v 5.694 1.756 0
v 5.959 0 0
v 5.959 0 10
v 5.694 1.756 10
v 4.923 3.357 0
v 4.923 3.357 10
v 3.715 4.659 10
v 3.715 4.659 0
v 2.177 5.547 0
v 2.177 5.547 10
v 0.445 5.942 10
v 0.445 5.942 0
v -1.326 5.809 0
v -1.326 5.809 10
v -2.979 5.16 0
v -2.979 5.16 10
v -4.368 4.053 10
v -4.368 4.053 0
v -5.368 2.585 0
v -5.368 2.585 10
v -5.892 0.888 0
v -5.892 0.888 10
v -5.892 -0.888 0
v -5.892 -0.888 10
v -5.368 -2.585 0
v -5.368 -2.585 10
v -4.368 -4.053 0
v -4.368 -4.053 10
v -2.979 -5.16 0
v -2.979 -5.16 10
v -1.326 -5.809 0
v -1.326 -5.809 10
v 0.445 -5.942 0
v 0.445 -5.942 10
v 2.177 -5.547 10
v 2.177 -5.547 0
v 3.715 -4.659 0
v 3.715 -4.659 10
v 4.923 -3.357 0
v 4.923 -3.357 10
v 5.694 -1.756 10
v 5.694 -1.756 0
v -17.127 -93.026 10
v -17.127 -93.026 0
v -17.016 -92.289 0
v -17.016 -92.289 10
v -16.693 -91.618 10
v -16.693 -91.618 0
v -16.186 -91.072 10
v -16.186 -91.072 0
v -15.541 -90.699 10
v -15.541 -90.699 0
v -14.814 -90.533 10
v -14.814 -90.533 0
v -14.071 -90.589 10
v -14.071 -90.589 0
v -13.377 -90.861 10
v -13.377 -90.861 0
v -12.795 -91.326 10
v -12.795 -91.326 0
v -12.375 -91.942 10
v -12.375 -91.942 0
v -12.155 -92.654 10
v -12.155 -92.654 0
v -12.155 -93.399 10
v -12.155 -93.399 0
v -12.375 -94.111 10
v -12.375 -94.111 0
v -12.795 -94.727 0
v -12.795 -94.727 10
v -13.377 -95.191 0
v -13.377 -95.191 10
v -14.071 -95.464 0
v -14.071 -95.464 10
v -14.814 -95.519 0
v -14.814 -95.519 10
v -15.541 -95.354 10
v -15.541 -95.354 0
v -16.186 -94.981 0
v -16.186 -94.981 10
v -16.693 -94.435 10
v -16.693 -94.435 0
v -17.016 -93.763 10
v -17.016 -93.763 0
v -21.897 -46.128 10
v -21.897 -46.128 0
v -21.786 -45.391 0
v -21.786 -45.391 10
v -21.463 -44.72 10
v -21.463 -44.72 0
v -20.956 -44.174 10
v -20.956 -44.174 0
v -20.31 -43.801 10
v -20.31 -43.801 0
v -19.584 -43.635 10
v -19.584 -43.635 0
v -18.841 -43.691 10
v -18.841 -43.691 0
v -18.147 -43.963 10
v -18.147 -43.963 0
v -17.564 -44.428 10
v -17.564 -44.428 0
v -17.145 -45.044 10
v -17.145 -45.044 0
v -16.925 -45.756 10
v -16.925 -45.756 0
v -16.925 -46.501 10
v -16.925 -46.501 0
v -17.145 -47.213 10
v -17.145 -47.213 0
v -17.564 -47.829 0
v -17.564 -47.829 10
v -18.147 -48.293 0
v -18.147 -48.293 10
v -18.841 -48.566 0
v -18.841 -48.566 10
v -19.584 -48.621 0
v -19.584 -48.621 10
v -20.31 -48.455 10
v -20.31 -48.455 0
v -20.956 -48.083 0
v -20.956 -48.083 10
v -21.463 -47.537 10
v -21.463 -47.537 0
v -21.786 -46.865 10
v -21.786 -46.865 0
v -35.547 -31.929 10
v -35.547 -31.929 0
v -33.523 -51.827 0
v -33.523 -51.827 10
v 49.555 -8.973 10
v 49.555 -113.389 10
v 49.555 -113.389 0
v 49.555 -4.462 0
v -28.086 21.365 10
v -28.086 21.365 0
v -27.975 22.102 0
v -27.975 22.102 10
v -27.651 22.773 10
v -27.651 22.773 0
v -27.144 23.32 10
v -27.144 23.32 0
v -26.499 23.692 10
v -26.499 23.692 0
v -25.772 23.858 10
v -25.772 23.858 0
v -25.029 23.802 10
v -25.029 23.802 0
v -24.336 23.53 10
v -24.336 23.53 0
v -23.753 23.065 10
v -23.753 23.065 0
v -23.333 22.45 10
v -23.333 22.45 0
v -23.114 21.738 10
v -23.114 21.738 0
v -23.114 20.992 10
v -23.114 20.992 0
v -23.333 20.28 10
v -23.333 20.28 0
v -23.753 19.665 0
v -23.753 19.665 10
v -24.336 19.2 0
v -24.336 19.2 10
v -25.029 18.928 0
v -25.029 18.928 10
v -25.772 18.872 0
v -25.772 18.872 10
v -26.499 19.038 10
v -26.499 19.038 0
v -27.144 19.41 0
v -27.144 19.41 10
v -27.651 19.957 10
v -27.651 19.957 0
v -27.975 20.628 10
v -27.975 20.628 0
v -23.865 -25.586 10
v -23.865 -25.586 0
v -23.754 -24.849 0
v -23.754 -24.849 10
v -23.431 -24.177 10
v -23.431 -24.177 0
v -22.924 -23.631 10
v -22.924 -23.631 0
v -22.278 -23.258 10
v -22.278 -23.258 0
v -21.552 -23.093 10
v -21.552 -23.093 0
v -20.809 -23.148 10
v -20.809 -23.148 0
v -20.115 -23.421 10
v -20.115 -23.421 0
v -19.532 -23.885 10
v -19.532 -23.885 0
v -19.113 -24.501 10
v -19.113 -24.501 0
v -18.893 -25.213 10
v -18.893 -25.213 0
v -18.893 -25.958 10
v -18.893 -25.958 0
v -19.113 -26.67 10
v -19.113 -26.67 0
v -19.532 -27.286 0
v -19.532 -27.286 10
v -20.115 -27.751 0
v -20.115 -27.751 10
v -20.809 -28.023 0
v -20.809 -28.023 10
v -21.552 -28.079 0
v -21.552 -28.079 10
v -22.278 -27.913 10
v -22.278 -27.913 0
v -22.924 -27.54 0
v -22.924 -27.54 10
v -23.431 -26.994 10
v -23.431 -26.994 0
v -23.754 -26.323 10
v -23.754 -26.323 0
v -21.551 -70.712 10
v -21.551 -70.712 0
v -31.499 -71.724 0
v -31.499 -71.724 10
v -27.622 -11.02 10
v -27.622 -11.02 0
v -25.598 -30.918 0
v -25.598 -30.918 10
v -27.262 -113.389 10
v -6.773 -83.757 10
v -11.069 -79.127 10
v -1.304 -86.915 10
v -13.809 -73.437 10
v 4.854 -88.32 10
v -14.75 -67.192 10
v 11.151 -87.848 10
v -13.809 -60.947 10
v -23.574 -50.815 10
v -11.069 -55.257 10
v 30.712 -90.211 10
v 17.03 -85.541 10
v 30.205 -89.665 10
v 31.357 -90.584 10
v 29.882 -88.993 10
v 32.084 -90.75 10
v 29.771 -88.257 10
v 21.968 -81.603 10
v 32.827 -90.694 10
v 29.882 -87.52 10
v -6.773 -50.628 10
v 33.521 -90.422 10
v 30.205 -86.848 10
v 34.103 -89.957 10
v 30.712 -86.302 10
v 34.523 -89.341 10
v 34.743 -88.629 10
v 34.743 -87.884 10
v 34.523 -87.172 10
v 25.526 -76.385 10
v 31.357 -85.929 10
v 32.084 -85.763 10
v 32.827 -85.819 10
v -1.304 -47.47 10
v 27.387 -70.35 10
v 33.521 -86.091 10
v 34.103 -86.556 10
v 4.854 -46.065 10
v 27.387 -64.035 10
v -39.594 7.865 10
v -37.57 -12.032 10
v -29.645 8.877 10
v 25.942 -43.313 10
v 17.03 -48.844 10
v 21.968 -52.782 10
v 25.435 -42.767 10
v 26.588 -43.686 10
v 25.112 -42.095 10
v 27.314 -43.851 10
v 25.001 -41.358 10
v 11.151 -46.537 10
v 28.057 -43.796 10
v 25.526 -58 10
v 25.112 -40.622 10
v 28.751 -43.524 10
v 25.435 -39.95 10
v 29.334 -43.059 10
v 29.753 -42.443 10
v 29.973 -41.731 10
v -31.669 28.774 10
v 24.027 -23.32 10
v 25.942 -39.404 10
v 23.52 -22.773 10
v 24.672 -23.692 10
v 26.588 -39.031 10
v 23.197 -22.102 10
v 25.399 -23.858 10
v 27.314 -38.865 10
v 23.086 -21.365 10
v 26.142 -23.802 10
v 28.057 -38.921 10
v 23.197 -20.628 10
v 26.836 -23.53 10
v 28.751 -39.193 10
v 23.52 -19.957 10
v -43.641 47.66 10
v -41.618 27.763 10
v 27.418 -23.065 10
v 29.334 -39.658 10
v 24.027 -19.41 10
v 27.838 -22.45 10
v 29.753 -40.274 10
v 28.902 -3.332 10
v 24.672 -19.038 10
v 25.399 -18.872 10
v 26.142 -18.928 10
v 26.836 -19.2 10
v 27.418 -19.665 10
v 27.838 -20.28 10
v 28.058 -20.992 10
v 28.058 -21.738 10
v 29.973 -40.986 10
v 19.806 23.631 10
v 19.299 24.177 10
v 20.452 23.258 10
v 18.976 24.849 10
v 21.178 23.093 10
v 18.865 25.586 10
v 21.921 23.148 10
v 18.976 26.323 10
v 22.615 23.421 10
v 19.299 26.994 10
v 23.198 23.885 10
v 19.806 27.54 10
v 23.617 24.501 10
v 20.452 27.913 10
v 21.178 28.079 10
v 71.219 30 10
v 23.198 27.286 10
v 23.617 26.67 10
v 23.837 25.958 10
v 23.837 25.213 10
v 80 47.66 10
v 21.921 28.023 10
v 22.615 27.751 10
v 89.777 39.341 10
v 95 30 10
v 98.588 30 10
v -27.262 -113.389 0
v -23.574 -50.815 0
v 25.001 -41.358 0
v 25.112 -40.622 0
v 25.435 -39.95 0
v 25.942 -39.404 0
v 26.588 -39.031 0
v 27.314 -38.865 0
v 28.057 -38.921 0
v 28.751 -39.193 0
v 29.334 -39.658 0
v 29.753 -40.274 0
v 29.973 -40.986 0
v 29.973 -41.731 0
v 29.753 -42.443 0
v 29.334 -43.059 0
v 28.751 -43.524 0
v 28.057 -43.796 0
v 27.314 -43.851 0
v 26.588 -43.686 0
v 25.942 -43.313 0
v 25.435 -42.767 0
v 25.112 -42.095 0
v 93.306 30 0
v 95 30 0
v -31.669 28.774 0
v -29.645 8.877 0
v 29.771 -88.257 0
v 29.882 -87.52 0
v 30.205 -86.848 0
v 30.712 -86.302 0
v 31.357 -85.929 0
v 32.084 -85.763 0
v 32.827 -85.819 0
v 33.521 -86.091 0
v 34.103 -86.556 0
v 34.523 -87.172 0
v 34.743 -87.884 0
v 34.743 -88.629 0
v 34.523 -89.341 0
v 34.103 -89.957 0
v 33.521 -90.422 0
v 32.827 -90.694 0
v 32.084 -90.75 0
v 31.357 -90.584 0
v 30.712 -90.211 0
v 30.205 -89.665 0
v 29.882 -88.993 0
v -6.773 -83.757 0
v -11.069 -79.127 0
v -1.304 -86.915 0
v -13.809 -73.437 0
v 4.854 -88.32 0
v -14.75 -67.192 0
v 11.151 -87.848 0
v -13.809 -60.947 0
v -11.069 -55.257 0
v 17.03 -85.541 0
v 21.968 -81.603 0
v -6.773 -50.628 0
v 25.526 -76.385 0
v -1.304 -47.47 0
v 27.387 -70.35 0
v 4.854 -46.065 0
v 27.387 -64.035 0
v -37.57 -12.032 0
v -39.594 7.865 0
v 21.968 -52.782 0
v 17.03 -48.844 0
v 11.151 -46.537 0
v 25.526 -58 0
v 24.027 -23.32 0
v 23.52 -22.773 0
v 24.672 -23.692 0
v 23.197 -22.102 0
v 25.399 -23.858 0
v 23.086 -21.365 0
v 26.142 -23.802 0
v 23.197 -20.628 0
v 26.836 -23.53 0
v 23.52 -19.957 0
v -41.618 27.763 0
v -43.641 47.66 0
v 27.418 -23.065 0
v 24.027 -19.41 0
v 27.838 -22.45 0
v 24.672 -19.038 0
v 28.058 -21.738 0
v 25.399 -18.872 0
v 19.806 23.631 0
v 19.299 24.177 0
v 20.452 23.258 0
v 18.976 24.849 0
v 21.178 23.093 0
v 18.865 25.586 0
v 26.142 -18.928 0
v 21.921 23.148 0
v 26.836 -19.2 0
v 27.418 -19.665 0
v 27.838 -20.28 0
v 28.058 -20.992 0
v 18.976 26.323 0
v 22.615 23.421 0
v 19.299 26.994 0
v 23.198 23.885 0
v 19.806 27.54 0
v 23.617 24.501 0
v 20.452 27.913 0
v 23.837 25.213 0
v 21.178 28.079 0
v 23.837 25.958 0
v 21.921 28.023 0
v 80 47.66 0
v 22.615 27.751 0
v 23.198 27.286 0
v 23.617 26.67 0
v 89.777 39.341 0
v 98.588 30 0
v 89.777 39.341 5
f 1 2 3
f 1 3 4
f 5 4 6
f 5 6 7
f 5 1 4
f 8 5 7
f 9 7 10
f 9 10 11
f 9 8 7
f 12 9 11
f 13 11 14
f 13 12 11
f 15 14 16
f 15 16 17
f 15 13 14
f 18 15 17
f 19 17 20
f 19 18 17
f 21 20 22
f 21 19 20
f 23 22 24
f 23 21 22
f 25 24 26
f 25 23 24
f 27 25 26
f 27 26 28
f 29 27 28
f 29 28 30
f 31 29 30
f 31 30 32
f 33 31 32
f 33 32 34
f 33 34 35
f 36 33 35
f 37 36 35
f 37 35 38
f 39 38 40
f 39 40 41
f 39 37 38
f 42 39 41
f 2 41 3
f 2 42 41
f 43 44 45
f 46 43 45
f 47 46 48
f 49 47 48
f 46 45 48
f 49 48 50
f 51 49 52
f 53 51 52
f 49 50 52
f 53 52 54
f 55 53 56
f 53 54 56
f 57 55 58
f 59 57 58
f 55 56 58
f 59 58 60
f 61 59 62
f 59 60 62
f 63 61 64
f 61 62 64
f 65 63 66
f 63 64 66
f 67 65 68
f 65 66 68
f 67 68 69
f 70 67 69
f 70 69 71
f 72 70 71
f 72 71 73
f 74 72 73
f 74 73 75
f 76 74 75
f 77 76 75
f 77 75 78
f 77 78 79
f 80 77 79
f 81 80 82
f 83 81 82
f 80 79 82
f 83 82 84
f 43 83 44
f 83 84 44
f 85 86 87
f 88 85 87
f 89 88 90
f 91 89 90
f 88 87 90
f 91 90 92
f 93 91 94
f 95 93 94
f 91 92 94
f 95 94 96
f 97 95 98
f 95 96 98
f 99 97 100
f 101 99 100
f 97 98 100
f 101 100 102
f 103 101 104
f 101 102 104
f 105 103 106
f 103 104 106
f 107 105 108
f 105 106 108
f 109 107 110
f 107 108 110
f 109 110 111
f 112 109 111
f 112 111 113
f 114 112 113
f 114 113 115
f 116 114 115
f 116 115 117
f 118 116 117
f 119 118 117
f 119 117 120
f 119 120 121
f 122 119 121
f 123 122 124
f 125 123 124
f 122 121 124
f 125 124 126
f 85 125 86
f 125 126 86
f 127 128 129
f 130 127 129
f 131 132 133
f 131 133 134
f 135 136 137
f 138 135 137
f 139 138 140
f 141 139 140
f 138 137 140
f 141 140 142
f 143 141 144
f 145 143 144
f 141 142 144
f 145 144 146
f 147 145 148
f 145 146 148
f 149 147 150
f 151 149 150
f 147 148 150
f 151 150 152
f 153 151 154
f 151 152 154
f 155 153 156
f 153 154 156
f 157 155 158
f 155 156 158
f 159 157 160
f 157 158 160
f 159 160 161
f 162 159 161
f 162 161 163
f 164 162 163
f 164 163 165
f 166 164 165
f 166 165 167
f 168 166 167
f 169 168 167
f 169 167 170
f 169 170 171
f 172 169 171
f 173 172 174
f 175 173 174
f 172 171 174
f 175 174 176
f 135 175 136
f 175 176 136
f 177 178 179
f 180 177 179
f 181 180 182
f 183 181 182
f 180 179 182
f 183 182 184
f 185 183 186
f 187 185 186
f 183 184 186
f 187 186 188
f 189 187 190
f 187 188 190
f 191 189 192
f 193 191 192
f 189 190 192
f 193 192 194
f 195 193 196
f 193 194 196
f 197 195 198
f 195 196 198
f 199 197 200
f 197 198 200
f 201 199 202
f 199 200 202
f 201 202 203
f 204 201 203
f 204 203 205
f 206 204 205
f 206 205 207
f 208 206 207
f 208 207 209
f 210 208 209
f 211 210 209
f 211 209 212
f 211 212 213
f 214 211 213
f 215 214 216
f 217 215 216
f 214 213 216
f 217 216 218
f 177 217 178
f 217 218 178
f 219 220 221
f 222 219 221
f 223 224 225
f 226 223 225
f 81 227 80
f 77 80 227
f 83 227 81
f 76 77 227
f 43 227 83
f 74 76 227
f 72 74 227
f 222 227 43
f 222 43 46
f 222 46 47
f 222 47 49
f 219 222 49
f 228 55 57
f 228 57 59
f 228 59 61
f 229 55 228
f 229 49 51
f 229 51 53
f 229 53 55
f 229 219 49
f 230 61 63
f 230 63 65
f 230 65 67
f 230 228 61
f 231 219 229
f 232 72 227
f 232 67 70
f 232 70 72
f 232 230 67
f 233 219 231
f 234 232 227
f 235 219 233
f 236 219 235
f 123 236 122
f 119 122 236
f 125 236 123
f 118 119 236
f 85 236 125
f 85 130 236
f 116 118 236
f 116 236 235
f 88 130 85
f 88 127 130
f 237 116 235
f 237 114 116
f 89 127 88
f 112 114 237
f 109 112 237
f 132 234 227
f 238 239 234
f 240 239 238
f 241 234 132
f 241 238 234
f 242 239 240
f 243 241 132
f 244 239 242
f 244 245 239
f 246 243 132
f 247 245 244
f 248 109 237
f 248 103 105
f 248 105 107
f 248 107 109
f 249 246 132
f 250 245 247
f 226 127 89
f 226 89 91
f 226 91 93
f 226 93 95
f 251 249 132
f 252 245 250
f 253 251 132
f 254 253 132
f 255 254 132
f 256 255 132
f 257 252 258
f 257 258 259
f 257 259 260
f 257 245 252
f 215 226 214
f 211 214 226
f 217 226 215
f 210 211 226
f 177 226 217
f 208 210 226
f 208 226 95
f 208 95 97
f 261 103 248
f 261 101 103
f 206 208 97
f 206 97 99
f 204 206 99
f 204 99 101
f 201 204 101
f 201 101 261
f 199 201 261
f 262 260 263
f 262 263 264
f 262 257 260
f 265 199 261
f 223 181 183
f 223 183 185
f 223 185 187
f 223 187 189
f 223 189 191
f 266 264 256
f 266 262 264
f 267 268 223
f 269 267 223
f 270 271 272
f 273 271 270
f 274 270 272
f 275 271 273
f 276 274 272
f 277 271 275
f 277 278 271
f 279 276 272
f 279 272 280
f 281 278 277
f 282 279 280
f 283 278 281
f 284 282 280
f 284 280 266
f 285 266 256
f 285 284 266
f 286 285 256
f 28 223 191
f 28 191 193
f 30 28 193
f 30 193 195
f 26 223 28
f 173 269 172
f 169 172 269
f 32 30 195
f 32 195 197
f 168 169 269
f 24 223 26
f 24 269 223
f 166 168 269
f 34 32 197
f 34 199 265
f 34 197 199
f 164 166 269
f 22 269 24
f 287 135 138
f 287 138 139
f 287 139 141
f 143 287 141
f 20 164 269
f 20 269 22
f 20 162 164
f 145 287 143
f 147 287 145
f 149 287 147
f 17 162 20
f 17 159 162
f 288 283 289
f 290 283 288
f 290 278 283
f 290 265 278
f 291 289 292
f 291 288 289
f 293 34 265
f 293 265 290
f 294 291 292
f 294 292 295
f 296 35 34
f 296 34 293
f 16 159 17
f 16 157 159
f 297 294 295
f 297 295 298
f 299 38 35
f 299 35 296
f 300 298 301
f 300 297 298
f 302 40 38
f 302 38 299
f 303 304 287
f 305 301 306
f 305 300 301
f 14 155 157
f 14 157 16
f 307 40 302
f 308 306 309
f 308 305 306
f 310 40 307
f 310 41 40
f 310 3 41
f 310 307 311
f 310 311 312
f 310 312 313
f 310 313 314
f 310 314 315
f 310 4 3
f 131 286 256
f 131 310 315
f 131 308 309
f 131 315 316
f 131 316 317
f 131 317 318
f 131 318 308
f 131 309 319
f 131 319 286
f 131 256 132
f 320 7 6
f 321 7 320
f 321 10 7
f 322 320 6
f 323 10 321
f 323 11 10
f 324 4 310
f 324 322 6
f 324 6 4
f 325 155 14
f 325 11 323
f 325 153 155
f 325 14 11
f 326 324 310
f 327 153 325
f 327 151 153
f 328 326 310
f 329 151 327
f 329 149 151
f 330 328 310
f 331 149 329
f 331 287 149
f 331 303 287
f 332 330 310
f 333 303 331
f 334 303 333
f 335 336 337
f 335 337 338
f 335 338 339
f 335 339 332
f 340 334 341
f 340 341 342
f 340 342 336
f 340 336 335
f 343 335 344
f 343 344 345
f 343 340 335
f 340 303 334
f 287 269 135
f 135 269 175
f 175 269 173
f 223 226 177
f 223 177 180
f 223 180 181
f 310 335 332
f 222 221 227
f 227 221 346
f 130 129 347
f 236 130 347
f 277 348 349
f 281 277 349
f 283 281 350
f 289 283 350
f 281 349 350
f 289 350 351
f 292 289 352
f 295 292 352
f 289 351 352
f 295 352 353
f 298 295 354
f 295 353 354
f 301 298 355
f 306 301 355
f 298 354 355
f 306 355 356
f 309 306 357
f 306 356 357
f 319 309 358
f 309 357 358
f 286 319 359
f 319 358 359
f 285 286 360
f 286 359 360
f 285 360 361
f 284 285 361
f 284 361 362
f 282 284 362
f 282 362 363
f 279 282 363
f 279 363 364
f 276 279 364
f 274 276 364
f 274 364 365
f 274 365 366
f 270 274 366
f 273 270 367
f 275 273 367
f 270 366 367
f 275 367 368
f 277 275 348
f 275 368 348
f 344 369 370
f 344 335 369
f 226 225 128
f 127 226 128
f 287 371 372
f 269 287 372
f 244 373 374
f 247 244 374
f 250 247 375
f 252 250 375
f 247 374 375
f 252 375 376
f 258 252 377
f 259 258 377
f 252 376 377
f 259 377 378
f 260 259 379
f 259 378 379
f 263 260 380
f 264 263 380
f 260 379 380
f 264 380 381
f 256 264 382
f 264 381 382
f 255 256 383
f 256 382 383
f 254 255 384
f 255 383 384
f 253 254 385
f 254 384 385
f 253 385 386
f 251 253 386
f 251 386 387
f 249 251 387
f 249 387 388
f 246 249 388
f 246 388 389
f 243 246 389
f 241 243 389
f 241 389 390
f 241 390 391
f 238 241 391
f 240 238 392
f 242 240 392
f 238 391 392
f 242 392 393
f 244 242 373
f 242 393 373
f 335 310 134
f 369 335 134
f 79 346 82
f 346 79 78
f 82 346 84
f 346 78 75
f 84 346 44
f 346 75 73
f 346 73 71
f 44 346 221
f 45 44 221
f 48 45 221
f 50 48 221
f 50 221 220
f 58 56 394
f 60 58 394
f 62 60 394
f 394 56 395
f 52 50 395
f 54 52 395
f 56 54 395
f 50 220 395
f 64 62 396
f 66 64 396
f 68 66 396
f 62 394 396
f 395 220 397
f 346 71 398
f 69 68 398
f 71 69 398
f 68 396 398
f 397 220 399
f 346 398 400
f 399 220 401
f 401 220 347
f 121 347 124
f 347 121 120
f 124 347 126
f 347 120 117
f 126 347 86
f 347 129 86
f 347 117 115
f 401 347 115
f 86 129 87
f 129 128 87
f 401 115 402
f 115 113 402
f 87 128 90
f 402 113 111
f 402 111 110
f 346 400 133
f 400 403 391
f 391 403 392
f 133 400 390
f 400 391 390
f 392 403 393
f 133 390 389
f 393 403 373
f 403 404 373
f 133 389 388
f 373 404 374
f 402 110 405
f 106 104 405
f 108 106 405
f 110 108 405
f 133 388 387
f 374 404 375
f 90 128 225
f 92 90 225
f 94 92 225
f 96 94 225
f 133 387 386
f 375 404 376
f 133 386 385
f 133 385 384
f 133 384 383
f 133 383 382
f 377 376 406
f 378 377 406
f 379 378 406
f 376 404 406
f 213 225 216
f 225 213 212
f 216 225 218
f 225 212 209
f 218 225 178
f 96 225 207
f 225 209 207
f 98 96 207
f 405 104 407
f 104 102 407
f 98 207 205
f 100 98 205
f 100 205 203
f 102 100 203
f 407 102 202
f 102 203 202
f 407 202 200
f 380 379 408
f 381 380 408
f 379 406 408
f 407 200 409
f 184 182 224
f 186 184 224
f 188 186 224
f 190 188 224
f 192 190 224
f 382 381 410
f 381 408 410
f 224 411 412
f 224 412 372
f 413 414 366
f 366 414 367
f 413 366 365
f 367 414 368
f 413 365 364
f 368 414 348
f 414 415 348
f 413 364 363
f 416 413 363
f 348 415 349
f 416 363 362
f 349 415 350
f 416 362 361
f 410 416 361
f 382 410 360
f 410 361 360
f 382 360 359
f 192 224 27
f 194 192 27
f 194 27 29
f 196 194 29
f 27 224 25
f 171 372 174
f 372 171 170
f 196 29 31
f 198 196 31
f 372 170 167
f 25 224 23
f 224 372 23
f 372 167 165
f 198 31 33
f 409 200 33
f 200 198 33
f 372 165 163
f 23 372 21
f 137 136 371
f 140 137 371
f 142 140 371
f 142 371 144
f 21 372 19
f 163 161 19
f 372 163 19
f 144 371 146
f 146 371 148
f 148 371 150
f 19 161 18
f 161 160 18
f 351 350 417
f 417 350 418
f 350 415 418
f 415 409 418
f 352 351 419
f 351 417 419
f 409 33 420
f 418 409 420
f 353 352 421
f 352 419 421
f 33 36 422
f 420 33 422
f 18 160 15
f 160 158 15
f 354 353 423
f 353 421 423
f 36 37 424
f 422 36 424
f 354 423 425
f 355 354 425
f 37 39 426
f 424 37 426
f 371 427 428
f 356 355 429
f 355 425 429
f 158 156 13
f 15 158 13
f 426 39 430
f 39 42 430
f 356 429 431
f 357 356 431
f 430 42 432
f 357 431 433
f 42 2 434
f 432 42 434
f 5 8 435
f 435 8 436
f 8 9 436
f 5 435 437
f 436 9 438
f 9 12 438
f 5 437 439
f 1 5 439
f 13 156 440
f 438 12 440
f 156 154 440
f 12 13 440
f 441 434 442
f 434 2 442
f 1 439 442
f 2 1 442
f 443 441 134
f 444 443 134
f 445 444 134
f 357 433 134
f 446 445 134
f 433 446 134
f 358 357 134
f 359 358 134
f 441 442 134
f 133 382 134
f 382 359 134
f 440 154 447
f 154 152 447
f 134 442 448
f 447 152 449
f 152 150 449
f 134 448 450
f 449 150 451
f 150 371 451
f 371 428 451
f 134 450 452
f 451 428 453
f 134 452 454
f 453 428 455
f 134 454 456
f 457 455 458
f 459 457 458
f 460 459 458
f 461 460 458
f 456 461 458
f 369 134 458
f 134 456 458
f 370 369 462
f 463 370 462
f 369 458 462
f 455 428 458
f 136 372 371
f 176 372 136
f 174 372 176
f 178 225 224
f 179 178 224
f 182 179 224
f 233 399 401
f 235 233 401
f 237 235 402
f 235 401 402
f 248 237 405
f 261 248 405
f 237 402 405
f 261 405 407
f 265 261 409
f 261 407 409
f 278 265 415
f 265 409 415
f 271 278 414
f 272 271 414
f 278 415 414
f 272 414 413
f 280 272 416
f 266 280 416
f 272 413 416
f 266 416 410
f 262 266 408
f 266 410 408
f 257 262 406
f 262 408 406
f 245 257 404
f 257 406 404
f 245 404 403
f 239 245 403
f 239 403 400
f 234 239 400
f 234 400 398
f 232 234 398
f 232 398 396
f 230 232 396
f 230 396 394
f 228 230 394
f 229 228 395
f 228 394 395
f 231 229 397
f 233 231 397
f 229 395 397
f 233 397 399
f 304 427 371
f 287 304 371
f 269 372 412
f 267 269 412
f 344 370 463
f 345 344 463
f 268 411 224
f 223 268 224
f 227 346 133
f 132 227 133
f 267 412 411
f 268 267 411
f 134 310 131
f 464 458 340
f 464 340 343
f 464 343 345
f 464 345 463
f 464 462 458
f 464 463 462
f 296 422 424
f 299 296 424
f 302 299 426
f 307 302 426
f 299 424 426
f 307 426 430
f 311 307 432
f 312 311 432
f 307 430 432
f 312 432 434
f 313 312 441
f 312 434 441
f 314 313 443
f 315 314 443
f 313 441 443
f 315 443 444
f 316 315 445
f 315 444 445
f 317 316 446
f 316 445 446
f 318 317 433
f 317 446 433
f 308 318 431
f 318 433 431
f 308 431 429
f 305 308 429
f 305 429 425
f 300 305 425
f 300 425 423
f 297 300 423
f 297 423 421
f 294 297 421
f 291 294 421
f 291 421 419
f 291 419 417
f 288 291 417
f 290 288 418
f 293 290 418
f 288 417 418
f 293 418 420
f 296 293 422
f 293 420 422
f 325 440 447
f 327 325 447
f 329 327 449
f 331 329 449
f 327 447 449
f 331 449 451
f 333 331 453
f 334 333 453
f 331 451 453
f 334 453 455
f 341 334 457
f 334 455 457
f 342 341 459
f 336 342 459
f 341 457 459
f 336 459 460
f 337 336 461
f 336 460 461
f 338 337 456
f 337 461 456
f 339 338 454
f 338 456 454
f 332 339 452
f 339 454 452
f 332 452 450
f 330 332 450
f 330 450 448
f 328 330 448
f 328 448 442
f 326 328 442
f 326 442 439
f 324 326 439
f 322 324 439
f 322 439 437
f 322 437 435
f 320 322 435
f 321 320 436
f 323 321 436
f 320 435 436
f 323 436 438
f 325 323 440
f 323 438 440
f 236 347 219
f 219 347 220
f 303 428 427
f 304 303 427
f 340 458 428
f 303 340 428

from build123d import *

# Parameters (mm, degrees)
SKETCH1_R           = 5.958520806
BOSS_EXTRUDE1_DEPTH = 10
SKETCH4_R           = 21.186821389
SKETCH4_R_2         = 2.5
CUT_EXTRUDE4_DEPTH  = 10
CUT_EXTRUDE5_DEPTH  = 24
CUT_EXTRUDE8_DEPTH  = 24
CUT_EXTRUDE9_DEPTH  = 24


with BuildPart() as part:
    # Sketch1 → Boss-Extrude1 (new body)
    with BuildSketch(Plane.XY):
        with BuildLine():
            Line((-43.641418847, 47.659934688), (-41.617733216, 27.762580681))
            Line((-41.617733216, 27.762580681), (-31.669056213, 28.774423496))
            Line((-31.669056213, 28.774423496), (-29.645370582, 8.877069489))
            Line((-29.645370582, 8.877069489), (-39.594047586, 7.865226674))
            Line((-39.594047586, 7.865226674), (-37.570361955, -12.032127333))
            Line((-37.570361955, -12.032127333), (-27.621684952, -11.020284517))
            Line((-27.621684952, -11.020284517), (-25.597999321, -30.917638524))
            Line((-25.597999321, -30.917638524), (-35.546676324, -31.929481339))
            Line((-35.546676324, -31.929481339), (-33.522990694, -51.826835346))
            Line((-33.522990694, -51.826835346), (-23.57431369, -50.814992531))
            Line((-23.57431369, -50.814992531), (-21.55062806, -70.712346537))
            Line((-21.55062806, -70.712346537), (-31.499305063, -71.724189353))
            Line((-31.499305063, -71.724189353), (-27.26172937, -113.389032166))
            Line((-27.26172937, -113.389032166), (95, -113.389032166))
            Line((95, -113.389032166), (95, 30.000000002))
            Line((95, 30.000000002), (98.587503094, 30.000000003))
            add(Edge.make_bspline(
                [(80, 47.659934688), (90.261106229, 39.851185476), (98.587503094, 30.000000003)],
                knots=[0, 0, 0, 1, 1, 1], degree=2))
            Line((80, 47.659934688), (-43.641418847, 47.659934688))
        make_face()
        Circle(SKETCH1_R, mode=Mode.SUBTRACT)
    extrude(amount=BOSS_EXTRUDE1_DEPTH)

    # Sketch4 → Cut-Extrude4 (cut)
    with BuildSketch(Plane(origin=(0, 0, 0), x_dir=(-1, 0, 0), z_dir=(0, 0, -1))):
        with Locations((-6.436847568, -67.192387913)):
            Circle(SKETCH4_R)
        with Locations((25.585650799, 21.365024531)):
            Circle(SKETCH4_R_2)
        with Locations((-21.365024531, 25.585650799)):
            Circle(SKETCH4_R_2)
        with Locations((14.627270614, -93.026333125)):
            Circle(SKETCH4_R_2)
        with Locations((-32.27079278, -88.256506094)):
            Circle(SKETCH4_R_2)
        with Locations((19.397097645, -46.128269731)):
            Circle(SKETCH4_R_2)
        with Locations((-27.500965749, -41.3584427)):
            Circle(SKETCH4_R_2)
        with Locations((-25.585650799, -21.365024531)):
            Circle(SKETCH4_R_2)
        with Locations((21.365024531, -25.585650799)):
            Circle(SKETCH4_R_2)
    extrude(amount=-CUT_EXTRUDE4_DEPTH, mode=Mode.SUBTRACT)

    # Sketch5 → Cut-Extrude5 (cut)
    with BuildSketch(Plane(origin=(-775.166388991, -380.154744581, 157.441443413), x_dir=(0.8989571240617148, -0.04918848761777317, -0.4352661045665824), z_dir=(0.3653798901208958, -0.4638751992455826, 0.807042338059233))):
        Polygon((845.932415327, 510.73775684), (653.191404901, 500.019526219), (653.191404901, 468.74716356), (845.932415327, 468.74716356), align=None)
    extrude(amount=CUT_EXTRUDE5_DEPTH, mode=Mode.SUBTRACT)

    # Sketch6 → Cut-Extrude8 (cut)
    with BuildSketch(Plane.XZ.offset(-29.999999993)):
        Polygon((93.306488259, 0), (98.587503096, 0), (98.587503096, 10), (71.218728104, 10), align=None)
    extrude(amount=CUT_EXTRUDE8_DEPTH, mode=Mode.SUBTRACT)

    # Sketch7 → Cut-Extrude9 (cut)
    with BuildSketch(Plane.XY.offset(10)):
        Polygon((95, -113.389032166), (49.555056821, -113.389032166), (49.555056821, -4.461625106), (95, 0), align=None)
    extrude(amount=-CUT_EXTRUDE9_DEPTH, mode=Mode.SUBTRACT)


solid = part.part
